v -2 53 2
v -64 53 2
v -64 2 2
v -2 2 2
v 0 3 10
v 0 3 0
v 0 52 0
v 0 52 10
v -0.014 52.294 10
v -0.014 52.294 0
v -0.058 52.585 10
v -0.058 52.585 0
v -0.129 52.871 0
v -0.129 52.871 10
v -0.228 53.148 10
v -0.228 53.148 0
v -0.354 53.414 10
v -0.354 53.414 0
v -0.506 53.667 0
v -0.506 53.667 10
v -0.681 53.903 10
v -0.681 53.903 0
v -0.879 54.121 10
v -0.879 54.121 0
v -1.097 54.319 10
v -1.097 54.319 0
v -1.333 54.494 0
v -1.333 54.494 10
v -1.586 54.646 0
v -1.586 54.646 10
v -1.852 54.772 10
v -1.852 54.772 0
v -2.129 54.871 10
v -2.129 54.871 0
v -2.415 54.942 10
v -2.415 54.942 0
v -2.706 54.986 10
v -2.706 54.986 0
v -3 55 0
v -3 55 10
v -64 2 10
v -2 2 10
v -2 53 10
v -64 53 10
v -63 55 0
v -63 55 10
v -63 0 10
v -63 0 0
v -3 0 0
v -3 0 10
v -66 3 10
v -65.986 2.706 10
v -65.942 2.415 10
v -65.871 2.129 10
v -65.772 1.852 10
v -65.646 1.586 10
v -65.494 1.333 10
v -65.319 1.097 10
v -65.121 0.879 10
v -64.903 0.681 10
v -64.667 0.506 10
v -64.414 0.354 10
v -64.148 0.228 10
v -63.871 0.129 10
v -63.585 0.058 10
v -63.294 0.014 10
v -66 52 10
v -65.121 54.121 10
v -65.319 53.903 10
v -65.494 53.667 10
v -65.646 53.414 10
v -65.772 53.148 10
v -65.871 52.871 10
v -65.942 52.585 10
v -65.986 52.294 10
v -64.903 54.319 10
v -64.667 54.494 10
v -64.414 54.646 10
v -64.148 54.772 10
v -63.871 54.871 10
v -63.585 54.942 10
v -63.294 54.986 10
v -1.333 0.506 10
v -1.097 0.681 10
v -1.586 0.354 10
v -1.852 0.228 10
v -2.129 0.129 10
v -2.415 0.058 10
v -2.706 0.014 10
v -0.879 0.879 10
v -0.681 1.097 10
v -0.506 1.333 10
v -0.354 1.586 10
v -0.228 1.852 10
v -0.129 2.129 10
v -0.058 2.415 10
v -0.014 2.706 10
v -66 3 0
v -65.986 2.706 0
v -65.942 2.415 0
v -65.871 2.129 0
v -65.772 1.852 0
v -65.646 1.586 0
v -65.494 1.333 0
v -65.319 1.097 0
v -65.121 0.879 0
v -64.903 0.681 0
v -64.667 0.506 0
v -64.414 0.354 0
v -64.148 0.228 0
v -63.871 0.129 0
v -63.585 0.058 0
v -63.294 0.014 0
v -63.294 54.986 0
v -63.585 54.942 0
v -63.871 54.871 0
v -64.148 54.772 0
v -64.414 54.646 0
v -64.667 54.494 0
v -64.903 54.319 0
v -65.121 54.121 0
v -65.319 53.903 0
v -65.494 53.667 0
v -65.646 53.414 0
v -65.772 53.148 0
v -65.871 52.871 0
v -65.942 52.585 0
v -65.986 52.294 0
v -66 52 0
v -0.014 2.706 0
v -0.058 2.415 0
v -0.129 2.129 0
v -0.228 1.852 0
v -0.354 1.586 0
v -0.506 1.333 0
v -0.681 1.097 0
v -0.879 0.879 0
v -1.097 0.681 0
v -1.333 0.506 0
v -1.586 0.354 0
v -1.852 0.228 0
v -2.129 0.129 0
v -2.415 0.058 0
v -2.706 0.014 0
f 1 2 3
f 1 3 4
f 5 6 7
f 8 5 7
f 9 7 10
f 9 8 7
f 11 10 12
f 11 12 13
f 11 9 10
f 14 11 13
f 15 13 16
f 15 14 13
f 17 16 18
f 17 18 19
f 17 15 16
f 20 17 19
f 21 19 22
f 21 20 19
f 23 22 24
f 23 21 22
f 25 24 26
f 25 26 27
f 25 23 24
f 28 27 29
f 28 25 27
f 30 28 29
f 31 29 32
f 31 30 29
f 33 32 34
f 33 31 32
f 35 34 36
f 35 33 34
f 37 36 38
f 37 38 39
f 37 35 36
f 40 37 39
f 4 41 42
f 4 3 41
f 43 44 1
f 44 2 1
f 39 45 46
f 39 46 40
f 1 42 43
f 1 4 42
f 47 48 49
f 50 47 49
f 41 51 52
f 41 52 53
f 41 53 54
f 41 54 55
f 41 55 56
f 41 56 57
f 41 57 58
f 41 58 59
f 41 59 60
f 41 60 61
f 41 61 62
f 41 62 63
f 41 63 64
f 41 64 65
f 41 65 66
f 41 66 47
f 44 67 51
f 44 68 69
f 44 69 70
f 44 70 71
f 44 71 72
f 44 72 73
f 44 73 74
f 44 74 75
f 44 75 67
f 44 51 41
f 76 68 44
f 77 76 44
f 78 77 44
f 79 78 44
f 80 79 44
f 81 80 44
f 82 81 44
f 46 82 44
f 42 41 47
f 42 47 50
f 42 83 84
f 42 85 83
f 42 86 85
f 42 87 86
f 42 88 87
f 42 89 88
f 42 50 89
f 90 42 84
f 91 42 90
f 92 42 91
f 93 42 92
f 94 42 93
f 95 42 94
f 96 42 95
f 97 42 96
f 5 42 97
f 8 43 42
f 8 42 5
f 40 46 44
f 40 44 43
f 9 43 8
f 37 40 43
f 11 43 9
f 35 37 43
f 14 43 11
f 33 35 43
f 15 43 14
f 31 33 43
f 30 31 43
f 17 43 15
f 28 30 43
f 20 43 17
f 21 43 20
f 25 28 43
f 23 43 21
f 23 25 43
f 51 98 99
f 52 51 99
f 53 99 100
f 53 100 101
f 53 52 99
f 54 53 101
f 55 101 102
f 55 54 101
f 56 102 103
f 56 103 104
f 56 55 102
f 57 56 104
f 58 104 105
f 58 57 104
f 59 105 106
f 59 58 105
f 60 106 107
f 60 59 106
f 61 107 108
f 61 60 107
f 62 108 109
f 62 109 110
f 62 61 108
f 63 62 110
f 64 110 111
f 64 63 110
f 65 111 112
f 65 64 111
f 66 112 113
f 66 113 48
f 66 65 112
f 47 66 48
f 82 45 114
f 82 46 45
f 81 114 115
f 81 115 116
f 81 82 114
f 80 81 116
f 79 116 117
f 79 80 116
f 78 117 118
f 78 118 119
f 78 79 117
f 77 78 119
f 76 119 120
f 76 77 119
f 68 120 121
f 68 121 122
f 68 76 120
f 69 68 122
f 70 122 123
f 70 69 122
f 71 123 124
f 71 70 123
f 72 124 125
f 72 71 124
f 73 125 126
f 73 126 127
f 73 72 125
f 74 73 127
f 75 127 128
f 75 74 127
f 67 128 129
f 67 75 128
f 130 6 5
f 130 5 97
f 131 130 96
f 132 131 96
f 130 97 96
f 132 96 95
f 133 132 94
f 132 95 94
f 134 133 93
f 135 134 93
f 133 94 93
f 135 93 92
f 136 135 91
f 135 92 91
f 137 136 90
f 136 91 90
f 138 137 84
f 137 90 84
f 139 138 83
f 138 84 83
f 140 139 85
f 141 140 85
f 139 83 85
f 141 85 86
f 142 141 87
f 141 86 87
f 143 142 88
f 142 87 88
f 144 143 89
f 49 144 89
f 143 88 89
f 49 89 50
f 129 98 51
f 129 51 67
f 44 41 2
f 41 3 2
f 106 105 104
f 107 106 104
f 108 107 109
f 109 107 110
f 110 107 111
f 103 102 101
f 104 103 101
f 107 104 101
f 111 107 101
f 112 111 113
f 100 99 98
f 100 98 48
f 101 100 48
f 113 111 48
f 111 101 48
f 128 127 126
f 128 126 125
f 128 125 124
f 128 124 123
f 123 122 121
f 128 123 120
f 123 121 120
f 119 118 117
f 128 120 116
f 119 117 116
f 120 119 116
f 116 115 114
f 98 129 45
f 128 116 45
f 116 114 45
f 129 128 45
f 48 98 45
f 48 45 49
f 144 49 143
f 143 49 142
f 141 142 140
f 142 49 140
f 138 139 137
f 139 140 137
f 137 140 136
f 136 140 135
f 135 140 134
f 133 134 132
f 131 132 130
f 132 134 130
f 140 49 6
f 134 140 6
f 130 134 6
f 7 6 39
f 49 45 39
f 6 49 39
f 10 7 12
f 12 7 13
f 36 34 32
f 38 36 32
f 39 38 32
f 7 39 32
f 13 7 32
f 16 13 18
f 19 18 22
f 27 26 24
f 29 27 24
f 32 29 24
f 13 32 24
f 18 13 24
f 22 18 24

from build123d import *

# Parameters (mm, degrees)
F0_W     = 66
F0_H     = 55
F1_DEPTH = 10
F2_T     = -2
F3_R     = 3
F4_R     = 3
F5_R     = 3
F6_R     = 3


with BuildPart() as f1:
    # F0 (on Top) → F1 (new body)
    with BuildSketch(Plane.XY):
        with Locations((-33, 27.5)):
            Rectangle(F0_W, F0_H)
    extrude(amount=F1_DEPTH)

    # F2
    f2_openings = [f1.faces().sort_by_distance(p)[0] for p in [
        (-33, 27.5, 10),
    ]]
    offset(amount=F2_T, openings=f2_openings)

    # F3
    f3_edges = [f1.edges().sort_by_distance(p)[0] for p in [
        (0, 55, 5),
    ]]
    fillet(f3_edges, radius=F3_R)

    # F4
    f4_edges = [f1.edges().sort_by_distance(p)[0] for p in [
        (0, 0, 5),
    ]]
    fillet(f4_edges, radius=F4_R)

    # F5
    f5_edges = [f1.edges().sort_by_distance(p)[0] for p in [
        (-66, 55, 5),
    ]]
    fillet(f5_edges, radius=F5_R)

    # F6
    f6_edges = [f1.edges().sort_by_distance(p)[0] for p in [
        (-66, 0, 5),
    ]]
    fillet(f6_edges, radius=F6_R)


solid = f1.part
